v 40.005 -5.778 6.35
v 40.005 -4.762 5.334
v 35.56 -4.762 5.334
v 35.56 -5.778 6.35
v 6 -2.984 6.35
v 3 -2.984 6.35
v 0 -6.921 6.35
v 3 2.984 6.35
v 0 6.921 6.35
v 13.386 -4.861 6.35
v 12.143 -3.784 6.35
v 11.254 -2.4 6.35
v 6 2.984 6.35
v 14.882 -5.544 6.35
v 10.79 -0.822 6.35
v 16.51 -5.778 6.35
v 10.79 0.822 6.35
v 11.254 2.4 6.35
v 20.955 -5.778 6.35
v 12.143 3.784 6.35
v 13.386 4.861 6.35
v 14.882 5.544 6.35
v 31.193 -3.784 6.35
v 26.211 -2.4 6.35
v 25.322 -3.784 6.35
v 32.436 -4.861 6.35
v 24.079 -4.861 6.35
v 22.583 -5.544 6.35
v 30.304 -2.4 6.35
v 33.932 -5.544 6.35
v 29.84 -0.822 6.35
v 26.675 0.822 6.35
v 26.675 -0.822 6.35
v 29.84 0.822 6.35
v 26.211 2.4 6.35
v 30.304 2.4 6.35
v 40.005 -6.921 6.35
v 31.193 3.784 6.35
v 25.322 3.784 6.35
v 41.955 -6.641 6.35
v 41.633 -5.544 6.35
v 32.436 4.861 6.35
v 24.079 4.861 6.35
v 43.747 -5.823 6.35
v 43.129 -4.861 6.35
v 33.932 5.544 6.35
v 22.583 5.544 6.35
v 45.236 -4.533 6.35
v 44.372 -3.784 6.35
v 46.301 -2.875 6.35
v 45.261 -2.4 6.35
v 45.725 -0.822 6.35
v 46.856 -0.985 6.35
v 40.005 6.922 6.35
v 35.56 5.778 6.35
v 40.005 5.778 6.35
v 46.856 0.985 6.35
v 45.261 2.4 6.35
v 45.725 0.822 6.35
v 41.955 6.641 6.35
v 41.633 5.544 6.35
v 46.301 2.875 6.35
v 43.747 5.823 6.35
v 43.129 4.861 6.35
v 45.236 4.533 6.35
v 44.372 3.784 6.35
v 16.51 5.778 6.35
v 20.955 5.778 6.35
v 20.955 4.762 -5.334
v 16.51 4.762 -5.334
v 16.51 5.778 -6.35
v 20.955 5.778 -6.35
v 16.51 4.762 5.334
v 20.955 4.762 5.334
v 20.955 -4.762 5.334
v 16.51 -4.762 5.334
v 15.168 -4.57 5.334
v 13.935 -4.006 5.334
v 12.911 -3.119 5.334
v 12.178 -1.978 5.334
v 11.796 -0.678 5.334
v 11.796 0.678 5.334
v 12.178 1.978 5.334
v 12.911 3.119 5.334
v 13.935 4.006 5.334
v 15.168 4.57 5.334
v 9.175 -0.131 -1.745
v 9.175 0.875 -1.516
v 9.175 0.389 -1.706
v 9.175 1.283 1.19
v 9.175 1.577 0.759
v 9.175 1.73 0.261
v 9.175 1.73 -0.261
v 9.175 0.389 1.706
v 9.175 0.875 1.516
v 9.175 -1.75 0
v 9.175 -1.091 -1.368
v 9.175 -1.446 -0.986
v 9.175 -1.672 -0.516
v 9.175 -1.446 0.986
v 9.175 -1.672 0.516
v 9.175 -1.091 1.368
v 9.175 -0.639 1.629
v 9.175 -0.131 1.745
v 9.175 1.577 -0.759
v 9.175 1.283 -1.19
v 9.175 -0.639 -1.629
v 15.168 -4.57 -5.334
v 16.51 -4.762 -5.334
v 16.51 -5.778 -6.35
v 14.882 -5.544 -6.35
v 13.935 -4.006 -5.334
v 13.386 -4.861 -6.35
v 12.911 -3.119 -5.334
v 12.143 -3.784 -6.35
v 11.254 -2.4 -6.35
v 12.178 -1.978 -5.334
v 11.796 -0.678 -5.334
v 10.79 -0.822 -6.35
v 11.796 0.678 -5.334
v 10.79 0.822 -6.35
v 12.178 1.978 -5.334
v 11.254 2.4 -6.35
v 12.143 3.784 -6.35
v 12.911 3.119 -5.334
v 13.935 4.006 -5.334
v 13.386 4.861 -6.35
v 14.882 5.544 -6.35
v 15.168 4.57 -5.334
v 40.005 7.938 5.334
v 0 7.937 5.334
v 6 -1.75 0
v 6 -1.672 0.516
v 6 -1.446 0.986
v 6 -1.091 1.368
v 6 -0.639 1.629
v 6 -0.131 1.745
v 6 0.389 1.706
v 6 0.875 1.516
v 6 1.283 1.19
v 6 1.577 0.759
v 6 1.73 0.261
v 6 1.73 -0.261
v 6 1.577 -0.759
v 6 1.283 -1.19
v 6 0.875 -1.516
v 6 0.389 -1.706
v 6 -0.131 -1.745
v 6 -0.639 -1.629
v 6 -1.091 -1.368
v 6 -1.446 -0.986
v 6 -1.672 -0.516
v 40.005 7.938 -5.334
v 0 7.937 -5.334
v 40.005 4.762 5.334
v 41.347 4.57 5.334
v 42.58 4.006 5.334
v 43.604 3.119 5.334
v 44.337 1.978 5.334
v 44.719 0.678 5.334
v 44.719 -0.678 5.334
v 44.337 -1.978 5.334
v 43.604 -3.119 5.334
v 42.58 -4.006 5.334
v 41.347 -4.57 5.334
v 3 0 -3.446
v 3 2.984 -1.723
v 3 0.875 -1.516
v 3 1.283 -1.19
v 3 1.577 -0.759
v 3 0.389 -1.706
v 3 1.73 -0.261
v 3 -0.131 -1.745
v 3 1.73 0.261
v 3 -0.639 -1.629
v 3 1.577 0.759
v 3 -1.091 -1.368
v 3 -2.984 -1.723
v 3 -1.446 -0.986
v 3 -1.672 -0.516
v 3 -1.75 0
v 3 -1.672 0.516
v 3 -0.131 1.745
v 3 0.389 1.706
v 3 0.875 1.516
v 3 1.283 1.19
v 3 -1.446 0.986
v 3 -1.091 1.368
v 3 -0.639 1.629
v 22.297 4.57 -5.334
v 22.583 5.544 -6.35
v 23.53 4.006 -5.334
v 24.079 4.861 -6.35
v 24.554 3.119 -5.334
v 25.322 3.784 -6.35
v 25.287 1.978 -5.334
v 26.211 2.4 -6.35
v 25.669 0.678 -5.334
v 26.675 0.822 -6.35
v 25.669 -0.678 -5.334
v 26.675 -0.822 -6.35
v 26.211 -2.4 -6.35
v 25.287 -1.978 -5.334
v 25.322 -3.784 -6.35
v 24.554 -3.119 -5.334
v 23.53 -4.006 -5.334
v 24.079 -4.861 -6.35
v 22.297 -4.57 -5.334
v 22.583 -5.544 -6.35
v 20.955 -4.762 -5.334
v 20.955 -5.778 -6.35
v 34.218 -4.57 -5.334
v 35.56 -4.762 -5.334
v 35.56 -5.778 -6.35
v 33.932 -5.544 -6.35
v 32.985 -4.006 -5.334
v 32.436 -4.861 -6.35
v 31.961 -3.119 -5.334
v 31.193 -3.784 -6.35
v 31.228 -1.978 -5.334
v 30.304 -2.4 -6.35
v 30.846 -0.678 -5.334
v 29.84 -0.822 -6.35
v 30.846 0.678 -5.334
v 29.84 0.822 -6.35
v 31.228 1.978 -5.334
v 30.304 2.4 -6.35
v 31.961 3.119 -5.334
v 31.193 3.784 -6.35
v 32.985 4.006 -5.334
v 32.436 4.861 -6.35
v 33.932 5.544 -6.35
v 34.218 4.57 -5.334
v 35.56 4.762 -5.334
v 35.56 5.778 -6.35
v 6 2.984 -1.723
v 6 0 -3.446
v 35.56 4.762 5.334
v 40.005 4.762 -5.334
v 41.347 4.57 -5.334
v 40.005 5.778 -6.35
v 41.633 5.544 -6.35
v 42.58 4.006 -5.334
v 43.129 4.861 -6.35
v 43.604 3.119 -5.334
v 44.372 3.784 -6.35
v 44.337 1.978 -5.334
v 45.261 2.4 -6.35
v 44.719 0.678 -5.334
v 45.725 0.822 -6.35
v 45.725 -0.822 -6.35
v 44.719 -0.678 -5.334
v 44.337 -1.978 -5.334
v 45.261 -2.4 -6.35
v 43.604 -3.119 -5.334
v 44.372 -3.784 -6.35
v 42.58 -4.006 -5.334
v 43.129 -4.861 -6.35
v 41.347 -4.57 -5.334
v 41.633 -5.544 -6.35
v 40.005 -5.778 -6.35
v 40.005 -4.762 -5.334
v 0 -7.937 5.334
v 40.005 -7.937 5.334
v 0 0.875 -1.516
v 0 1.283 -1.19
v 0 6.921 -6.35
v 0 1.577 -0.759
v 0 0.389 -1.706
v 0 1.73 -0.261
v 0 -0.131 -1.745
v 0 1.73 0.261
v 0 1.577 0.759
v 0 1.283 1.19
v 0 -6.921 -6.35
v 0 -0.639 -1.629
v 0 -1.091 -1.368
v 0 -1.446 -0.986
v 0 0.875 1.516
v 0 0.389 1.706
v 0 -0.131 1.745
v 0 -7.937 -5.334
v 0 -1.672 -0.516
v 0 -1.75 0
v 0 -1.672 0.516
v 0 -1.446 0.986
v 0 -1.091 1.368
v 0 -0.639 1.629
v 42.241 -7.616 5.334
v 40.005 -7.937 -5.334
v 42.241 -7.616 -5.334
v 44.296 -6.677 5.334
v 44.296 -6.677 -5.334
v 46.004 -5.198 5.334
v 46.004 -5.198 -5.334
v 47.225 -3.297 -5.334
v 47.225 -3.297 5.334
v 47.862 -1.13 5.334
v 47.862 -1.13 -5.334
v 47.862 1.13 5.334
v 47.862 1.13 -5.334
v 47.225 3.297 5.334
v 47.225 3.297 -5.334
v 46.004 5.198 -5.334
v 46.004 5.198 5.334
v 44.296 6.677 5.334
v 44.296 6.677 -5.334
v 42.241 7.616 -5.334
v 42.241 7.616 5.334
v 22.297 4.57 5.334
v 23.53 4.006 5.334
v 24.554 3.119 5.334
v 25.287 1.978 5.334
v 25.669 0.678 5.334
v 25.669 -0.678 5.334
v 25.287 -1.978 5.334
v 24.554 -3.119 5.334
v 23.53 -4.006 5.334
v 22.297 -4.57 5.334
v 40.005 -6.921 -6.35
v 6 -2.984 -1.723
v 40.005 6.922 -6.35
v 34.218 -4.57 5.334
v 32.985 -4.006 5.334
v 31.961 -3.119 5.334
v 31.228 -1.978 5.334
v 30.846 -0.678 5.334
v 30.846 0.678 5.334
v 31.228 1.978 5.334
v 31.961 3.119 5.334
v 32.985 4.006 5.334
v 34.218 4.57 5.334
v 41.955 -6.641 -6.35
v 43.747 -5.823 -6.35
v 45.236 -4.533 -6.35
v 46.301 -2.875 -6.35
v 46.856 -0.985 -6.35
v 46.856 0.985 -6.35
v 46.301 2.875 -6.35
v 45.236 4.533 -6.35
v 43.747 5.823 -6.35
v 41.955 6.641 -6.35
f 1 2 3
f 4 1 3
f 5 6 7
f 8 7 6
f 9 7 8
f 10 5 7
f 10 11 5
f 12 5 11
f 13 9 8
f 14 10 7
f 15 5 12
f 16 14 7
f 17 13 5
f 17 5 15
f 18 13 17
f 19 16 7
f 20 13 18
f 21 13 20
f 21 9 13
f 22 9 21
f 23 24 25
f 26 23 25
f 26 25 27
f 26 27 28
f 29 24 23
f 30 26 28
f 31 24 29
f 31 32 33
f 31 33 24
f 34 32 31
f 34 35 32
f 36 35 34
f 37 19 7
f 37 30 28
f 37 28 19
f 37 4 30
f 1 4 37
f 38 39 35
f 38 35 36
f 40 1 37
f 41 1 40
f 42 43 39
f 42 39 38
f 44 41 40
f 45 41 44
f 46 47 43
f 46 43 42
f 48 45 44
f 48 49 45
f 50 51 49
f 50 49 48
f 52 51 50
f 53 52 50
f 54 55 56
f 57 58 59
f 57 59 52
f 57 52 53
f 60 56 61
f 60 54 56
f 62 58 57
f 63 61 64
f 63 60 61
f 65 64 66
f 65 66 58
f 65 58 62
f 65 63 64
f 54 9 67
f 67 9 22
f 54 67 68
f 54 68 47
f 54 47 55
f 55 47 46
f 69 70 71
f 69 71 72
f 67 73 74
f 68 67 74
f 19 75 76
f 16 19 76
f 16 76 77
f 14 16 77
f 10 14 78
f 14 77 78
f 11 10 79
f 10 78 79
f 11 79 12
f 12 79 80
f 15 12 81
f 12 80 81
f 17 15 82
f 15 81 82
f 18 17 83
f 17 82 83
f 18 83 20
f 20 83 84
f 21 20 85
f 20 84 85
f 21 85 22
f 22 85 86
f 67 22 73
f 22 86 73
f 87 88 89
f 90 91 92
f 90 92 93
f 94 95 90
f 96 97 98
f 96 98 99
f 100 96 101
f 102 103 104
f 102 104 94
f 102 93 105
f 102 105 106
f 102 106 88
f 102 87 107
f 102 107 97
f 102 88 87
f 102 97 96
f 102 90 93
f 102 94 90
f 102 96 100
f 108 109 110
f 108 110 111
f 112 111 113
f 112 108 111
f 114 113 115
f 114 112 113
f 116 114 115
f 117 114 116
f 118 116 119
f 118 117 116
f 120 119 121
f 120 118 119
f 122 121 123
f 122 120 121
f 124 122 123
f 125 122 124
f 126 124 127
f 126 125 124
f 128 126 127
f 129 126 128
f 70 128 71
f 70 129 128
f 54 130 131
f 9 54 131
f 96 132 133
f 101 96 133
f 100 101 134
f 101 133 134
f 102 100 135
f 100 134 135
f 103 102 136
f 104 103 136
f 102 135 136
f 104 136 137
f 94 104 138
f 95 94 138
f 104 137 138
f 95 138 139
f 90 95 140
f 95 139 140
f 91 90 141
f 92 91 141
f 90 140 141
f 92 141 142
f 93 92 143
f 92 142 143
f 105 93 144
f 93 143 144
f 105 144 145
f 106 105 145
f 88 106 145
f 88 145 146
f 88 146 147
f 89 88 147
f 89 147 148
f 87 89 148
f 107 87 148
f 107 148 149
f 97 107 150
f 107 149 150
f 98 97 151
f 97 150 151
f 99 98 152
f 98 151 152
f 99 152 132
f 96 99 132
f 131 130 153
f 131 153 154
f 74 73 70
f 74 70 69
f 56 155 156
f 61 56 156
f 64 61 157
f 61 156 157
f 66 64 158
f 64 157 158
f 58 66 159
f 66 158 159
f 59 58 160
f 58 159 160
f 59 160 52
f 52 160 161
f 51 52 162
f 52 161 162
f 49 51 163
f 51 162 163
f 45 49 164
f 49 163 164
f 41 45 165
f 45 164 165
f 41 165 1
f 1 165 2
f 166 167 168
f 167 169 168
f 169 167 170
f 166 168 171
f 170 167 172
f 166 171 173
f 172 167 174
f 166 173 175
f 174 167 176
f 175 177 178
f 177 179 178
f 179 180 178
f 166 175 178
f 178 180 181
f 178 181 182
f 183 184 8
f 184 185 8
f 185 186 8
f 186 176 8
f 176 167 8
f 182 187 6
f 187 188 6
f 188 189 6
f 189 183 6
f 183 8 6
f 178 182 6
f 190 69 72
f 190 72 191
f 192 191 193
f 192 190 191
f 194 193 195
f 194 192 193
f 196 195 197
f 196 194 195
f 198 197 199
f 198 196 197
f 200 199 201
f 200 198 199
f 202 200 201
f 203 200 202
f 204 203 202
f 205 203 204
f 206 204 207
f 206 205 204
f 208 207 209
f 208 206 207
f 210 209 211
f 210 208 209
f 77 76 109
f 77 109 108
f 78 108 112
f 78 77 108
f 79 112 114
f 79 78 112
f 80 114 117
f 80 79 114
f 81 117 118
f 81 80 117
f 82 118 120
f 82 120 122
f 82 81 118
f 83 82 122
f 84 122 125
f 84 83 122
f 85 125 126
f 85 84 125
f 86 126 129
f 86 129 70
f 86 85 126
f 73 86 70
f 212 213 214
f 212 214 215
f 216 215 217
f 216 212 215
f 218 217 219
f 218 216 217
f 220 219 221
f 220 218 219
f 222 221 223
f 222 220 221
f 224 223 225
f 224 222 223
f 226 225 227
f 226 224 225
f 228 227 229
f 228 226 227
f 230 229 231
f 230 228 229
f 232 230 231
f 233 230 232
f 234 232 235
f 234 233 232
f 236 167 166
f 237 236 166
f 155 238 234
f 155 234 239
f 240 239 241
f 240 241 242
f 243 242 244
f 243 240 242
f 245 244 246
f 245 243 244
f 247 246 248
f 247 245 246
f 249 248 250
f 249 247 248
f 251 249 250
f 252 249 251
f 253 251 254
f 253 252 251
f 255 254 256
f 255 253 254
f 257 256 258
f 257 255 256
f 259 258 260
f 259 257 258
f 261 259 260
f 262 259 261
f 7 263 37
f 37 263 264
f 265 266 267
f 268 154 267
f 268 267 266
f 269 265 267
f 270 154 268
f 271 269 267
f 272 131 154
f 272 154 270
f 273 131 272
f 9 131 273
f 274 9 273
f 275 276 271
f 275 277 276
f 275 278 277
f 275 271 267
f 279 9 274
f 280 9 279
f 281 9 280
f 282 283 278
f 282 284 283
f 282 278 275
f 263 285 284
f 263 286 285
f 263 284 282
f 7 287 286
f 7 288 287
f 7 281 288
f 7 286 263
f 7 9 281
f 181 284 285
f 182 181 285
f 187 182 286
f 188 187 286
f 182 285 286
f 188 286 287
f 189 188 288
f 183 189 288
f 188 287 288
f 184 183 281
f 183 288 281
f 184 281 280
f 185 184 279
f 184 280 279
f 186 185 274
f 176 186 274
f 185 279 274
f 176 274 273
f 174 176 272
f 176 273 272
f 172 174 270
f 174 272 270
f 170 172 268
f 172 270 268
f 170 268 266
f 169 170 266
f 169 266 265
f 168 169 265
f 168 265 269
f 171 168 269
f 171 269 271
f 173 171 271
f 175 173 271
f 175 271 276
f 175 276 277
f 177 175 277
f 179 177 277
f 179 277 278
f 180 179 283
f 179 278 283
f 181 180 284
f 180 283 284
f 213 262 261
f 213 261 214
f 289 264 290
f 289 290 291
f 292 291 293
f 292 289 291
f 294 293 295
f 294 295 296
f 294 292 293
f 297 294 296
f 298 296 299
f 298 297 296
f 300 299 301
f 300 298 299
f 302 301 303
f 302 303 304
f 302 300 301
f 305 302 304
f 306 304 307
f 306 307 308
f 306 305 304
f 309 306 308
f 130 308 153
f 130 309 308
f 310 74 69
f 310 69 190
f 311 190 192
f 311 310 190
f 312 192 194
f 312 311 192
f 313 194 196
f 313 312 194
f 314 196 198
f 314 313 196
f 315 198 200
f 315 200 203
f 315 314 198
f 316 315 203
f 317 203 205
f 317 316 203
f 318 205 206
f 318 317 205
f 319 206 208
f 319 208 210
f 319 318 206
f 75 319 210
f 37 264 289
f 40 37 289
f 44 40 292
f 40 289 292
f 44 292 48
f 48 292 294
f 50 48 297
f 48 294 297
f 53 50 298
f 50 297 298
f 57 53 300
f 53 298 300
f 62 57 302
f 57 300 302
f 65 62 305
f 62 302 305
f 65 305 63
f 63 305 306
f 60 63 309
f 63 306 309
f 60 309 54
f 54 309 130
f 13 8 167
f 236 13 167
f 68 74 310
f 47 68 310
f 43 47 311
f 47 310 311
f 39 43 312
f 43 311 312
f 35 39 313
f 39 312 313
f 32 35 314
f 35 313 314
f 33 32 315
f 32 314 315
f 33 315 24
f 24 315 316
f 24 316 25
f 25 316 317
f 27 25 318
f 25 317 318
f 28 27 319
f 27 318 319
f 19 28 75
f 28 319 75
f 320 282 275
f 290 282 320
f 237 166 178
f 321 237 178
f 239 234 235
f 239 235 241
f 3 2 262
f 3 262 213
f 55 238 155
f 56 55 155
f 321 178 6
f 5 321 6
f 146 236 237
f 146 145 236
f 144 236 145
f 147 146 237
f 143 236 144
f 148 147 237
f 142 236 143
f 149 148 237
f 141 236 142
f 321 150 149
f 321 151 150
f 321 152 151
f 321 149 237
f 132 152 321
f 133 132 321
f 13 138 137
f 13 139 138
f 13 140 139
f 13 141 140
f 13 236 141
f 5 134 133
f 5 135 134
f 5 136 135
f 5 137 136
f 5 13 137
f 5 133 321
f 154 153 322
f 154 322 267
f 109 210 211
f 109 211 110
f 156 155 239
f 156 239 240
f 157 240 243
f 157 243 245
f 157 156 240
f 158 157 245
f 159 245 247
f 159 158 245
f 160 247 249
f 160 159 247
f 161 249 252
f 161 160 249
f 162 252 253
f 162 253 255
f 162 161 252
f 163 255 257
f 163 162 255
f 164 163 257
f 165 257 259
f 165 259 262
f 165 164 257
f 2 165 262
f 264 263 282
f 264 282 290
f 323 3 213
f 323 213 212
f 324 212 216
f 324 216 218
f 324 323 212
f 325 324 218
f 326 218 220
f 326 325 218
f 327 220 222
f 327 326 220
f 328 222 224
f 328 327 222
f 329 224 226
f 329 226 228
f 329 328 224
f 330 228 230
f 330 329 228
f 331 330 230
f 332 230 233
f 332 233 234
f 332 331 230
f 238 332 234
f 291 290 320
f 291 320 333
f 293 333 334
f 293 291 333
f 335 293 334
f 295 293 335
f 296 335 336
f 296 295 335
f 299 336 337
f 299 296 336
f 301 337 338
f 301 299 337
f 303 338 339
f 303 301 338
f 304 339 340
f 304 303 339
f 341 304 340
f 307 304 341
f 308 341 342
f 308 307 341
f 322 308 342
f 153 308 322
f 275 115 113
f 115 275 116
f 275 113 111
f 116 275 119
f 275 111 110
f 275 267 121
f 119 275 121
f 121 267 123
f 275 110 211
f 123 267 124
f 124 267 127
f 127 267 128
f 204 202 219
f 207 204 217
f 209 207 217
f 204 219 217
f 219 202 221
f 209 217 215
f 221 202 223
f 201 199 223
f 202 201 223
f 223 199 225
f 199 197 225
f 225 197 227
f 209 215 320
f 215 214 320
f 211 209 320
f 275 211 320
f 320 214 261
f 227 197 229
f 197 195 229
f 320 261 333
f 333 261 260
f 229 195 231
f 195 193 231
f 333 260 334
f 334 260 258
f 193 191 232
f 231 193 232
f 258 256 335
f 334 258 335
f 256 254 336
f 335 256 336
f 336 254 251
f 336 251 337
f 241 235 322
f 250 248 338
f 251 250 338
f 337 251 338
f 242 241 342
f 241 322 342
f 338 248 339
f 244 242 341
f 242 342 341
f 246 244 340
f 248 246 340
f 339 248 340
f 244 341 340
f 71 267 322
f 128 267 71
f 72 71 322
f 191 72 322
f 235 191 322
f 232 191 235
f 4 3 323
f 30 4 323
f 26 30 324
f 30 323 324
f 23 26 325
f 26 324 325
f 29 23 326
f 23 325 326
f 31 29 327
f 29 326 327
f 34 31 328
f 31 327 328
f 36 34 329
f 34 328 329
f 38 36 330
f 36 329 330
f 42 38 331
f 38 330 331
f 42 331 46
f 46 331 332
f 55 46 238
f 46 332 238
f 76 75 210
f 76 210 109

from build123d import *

# Parameters (mm, degrees)
F1_DEPTH = 6.35
F2_R     = 1.75
F3_DEPTH = 3
F5_DEPTH = 3
F6_R     = 1.75
F7_DEPTH = 3.175
F8_SIZE  = 1.016


with BuildPart() as f1:
    # F0 (on Top) → F1 (new body, symmetric)
    with BuildSketch(Plane.XY):
        with BuildLine():
            Line((40.005, 7.9375), (0, 7.9375))
            Line((0, 7.9375), (0, -7.9375))
            Line((0, -7.9375), (40.005, -7.9375))
            ThreePointArc((40.005, -7.9375), (47.9425, 0), (40.005, 7.9375))
        make_face()
        with BuildLine():
            Line((20.955, -4.7625), (16.51, -4.7625))
            ThreePointArc((16.51, -4.7625), (11.7475, 0), (16.51, 4.7625))
            Line((16.51, 4.7625), (20.955, 4.7625))
            ThreePointArc((20.955, 4.7625), (25.7175, 0), (20.955, -4.7625))
        make_face(mode=Mode.SUBTRACT)
        with BuildLine():
            Line((40.005, -4.7625), (35.56, -4.7625))
            ThreePointArc((35.56, -4.7625), (30.7975, 0), (35.56, 4.7625))
            Line((35.56, 4.7625), (40.005, 4.7625))
            ThreePointArc((40.005, 4.7625), (44.7675, 0), (40.005, -4.7625))
        make_face(mode=Mode.SUBTRACT)
    extrude(amount=F1_DEPTH, both=True)

    # F2 (on face) → F3 (cut)
    with BuildSketch(Plane(origin=(0, 0, 0), x_dir=(0, -1, 0), z_dir=(-1, 0, 0))):
        Circle(F2_R)
    extrude(amount=-F3_DEPTH, mode=Mode.SUBTRACT)

    # F4 (on face) → F5 (cut)
    with BuildSketch(Plane(origin=(3, 0, 0), x_dir=(0, -1, 0), z_dir=(-1, 0, 0))):
        Polygon((2.9845, -1.7231018784), (2.9845, 1.7231018784), (2.9845, 6.35), (-2.9845, 6.35), (-2.9845, 1.7231018784), (-2.9845, -1.7231018784), (0, -3.4462037568), align=None)
    extrude(amount=-F5_DEPTH, mode=Mode.SUBTRACT)

    # F6 (on face) → F7 (cut)
    with BuildSketch(Plane(origin=(6, 0, 0), x_dir=(0, -1, 0), z_dir=(-1, 0, 0))):
        Circle(F6_R)
    extrude(amount=-F7_DEPTH, mode=Mode.SUBTRACT)

    # F8
    f8_edges = [f1.edges().sort_by_distance(p)[0] for p in [
        (20.0025, -7.9375, 6.35),
        (20.0025, -7.9375, -6.35),
        (25.7175, 0, 6.35),
        (30.7975, 0, 6.35),
        (30.7975, 0, -6.35),
        (25.7175, 0, -6.35),
    ]]
    chamfer(f8_edges, length=F8_SIZE)


solid = f1.part
